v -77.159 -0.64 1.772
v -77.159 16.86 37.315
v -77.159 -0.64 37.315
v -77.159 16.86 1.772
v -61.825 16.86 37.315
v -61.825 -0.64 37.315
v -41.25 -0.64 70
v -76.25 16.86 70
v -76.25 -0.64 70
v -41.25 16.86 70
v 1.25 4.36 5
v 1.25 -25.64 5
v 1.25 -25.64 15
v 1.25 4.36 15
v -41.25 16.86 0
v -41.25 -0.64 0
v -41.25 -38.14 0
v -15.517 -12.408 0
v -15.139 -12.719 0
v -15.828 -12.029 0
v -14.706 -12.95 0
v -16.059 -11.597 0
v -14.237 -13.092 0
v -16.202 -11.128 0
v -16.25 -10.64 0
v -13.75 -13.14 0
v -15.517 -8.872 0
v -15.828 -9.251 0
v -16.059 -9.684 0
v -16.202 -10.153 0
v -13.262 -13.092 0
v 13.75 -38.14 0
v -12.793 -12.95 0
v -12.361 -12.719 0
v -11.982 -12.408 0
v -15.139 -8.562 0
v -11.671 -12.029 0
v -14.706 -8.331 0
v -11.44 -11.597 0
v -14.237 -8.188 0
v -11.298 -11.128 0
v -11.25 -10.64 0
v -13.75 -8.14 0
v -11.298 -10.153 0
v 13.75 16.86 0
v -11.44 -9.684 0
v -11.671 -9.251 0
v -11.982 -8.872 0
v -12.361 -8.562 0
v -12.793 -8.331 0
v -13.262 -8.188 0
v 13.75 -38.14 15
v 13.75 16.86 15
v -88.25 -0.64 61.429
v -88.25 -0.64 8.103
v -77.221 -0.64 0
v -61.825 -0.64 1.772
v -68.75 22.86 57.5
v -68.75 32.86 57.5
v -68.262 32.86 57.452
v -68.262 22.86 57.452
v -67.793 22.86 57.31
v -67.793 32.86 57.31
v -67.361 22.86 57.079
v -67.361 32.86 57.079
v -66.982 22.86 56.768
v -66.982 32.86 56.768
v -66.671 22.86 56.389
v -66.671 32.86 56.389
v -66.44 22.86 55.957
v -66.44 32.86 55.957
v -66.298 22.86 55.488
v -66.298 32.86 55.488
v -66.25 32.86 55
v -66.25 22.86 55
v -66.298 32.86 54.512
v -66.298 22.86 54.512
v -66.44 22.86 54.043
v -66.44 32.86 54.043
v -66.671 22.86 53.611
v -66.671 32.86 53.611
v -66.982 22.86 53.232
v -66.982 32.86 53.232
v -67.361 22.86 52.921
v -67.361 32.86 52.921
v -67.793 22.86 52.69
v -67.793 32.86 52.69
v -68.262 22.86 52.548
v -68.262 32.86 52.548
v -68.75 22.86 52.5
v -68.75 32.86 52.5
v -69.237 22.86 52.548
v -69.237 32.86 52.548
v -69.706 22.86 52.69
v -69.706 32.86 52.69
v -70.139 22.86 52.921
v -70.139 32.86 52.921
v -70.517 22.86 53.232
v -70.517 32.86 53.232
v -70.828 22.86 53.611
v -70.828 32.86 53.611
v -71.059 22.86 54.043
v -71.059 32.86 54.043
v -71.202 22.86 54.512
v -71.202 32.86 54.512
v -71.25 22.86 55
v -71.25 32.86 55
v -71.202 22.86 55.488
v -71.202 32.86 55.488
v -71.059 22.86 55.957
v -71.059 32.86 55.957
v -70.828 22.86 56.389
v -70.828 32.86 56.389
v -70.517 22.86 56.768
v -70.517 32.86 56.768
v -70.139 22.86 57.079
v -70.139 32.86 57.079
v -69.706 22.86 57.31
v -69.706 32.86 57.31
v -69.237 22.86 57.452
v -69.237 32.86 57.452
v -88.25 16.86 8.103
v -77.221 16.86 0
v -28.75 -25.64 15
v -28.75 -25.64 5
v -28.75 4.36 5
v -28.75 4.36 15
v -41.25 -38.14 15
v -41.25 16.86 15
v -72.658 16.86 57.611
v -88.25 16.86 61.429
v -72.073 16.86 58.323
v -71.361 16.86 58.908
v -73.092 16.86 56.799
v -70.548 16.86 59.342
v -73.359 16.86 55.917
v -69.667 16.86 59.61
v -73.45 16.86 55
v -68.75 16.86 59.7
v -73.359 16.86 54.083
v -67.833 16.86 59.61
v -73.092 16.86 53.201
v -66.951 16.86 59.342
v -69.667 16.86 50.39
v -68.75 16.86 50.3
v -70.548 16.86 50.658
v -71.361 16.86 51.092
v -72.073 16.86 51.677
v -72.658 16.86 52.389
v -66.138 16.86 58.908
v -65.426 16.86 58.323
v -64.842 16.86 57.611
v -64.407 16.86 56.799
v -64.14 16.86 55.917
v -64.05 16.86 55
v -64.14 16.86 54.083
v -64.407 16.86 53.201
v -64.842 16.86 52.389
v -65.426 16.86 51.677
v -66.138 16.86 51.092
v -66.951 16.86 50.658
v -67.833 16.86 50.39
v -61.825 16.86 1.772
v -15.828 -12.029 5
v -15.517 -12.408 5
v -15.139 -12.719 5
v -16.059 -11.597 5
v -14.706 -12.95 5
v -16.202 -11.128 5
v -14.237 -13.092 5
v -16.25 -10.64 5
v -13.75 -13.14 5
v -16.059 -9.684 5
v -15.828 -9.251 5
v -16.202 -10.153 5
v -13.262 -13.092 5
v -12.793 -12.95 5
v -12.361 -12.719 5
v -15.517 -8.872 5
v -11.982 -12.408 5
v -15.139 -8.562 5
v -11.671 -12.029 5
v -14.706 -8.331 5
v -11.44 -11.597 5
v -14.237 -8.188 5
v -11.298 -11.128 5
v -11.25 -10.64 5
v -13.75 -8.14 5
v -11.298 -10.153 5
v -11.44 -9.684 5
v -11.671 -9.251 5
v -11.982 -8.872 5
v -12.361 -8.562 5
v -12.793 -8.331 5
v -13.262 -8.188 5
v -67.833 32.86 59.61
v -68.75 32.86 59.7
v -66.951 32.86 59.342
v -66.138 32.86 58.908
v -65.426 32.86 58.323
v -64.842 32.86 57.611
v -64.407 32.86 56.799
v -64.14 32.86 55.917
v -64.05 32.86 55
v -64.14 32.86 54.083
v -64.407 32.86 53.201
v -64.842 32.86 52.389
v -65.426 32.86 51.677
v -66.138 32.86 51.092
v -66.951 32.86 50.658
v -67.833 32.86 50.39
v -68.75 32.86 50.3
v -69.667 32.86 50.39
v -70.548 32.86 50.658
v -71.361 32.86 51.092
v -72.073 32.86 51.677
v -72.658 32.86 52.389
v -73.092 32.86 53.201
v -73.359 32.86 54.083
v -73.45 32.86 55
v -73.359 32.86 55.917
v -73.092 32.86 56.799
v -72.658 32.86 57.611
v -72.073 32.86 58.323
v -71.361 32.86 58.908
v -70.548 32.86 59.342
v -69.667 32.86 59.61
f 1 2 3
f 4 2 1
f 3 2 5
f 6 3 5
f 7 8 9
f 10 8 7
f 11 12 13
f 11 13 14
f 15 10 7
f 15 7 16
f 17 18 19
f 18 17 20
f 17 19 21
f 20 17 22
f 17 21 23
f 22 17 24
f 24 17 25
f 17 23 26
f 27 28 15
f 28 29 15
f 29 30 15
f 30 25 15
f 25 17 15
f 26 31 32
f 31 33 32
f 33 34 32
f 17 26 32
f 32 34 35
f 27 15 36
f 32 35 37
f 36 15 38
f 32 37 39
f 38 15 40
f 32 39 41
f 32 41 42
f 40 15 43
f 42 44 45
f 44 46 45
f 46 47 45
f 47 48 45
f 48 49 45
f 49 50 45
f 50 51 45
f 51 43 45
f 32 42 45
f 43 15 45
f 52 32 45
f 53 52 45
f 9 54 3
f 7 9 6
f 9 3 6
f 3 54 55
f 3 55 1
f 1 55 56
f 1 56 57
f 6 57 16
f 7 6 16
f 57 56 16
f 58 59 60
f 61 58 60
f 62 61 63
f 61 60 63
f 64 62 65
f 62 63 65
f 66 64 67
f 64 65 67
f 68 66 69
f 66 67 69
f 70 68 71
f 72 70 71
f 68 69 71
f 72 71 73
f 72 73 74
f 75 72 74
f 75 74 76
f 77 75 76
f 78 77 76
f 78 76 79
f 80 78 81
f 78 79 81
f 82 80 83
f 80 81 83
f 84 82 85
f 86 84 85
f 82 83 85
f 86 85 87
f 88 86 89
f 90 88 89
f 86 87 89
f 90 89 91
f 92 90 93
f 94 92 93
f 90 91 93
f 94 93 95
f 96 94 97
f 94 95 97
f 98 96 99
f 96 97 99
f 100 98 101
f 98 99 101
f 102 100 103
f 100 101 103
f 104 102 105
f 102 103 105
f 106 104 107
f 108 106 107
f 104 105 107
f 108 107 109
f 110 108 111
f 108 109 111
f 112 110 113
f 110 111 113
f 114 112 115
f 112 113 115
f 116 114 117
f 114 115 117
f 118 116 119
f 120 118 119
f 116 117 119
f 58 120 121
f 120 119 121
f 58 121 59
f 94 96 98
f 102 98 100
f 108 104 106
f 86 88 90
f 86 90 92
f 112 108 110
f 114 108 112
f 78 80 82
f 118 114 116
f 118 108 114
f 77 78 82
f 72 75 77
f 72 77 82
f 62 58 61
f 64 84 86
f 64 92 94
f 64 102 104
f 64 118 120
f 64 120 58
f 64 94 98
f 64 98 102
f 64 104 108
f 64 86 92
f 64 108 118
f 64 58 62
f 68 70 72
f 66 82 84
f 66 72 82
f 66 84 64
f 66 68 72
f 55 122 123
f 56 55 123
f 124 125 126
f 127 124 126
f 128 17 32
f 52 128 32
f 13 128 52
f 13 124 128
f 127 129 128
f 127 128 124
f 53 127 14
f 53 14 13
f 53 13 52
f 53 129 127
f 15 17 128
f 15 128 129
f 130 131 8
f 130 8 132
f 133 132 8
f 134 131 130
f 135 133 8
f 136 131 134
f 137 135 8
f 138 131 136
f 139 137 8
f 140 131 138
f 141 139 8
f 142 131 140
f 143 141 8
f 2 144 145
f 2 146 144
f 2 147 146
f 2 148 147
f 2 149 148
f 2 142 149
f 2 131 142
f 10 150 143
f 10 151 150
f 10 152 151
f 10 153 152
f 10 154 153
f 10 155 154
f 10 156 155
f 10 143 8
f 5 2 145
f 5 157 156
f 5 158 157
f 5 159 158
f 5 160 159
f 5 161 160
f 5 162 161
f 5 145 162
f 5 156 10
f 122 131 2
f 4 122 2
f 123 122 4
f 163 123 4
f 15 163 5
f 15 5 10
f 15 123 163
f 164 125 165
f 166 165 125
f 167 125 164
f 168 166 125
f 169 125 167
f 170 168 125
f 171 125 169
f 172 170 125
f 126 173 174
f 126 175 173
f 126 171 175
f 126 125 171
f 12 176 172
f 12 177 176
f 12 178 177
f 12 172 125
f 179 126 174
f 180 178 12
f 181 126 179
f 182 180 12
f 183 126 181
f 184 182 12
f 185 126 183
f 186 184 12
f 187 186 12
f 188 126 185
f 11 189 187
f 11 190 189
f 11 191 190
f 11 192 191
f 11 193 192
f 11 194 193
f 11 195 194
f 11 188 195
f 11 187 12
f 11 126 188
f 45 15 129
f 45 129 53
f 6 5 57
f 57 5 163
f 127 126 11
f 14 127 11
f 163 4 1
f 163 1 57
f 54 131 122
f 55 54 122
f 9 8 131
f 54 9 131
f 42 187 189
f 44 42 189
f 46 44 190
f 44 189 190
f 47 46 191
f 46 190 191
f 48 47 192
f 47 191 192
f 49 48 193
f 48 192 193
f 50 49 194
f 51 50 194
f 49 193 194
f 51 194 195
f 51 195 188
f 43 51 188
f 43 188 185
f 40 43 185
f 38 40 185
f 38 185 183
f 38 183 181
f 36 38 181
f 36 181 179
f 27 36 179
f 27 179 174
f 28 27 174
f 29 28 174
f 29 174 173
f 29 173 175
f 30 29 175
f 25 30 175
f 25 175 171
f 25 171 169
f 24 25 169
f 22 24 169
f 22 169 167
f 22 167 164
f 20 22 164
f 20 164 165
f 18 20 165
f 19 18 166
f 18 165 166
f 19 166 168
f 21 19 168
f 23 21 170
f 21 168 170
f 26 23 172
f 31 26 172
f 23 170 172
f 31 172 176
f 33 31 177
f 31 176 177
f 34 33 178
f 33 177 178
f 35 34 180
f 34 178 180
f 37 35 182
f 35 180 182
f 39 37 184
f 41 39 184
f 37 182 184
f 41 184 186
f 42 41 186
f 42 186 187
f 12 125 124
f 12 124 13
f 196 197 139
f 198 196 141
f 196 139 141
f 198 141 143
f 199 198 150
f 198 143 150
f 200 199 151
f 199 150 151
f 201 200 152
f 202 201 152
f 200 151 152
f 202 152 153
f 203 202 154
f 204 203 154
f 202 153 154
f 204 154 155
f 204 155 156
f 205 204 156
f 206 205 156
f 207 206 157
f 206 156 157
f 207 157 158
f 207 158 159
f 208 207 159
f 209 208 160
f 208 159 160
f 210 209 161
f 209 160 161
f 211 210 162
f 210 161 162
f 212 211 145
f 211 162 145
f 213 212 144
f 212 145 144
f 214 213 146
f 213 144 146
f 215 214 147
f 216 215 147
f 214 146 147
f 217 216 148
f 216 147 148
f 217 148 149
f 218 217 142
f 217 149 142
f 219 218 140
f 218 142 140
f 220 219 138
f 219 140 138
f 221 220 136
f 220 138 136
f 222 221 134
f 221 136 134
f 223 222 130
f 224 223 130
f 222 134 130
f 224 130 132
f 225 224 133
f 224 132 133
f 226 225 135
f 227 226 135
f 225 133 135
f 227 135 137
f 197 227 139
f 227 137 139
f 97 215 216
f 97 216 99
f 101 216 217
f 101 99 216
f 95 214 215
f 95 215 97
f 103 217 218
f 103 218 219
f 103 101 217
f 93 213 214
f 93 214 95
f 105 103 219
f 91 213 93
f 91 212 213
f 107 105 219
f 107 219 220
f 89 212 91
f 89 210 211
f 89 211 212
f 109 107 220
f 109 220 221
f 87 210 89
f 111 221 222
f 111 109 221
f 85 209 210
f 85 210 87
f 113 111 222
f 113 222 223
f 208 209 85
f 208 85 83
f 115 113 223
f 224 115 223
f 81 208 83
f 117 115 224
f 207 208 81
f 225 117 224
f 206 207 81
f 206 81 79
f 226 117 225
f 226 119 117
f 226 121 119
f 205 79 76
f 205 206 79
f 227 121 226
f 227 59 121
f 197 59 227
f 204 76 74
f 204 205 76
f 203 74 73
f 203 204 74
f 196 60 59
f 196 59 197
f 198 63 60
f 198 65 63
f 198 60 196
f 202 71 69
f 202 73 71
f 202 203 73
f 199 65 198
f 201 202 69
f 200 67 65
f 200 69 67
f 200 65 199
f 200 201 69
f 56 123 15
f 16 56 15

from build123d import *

# Parameters (mm, degrees)
SKETCH1_W           = 55
SKETCH1_H           = 55
SKETCH1_W_2         = 30
SKETCH1_H_2         = 30
BOSS_EXTRUDE1_DEPTH = 15
SKETCH5_W           = 70
SKETCH5_H           = 70
BOSS_EXTRUDE4_DEPTH = 17.5
CUT_EXTRUDE1_DEPTH  = 143.483240955
SKETCH8_W           = 15.334329656
SKETCH8_H           = 35.542805721
CUT_EXTRUDE3_DEPTH  = 126.3514749
SKETCH9_R           = 4.7
BOSS_EXTRUDE5_DEPTH = 16
SKETCH10_R          = 2.5
CUT_EXTRUDE4_DEPTH  = 10
SKETCH12_W          = 30
SKETCH12_H          = 30
BOSS_EXTRUDE6_DEPTH = 5
SKETCH13_R          = 2.5
CUT_EXTRUDE5_DEPTH  = 117.050297595


with BuildPart() as part:
    # Sketch1 → Boss-Extrude1 (new body)
    with BuildSketch(Plane.XY):
        with Locations((-13.749602036, -10.640258422)):
            Rectangle(SKETCH1_W, SKETCH1_H)
        with Locations((-13.749602036, -10.640258422)):
            Rectangle(SKETCH1_W_2, SKETCH1_H_2, mode=Mode.SUBTRACT)
    extrude(amount=BOSS_EXTRUDE1_DEPTH)

    # Sketch12 → Boss-Extrude6 (add)
    with BuildSketch(Plane(origin=(-732.77025481, -892.317517431, 5), x_dir=(1, 0, 0), z_dir=(0, 0, 1))):
        with Locations((719.020652774, 881.677259009)):
            Rectangle(SKETCH12_W, SKETCH12_H)
    extrude(amount=-BOSS_EXTRUDE6_DEPTH)

    # Sketch13 → Cut-Extrude5 (cut, through all)
    with BuildSketch(Plane.XY.offset(5)):
        with Locations((-13.749602036, -10.640258422)):
            Circle(SKETCH13_R)
    extrude(amount=-CUT_EXTRUDE5_DEPTH, mode=Mode.SUBTRACT)


with BuildPart() as body_2:
    # Sketch5 → Boss-Extrude4 (new body)
    with BuildSketch(Plane(origin=(0, 16.859741578, 0), x_dir=(1, 0, 0), z_dir=(0, 1, 0))):
        with Locations((-76.249602036, -35)):
            Rectangle(SKETCH5_W, SKETCH5_H)
    extrude(amount=-BOSS_EXTRUDE4_DEPTH)

    # Sketch6 → Cut-Extrude1 (cut, through all)
    with BuildSketch(Plane(origin=(0, 16.859741578, 0), x_dir=(1, 0, 0), z_dir=(0, 1, 0))):
        Polygon((-77.220552794, 0), (-111.249602036, 0), (-111.249602036, -70), (-76.249602036, -70), (-88.249602036, -61.428571429), (-88.249602036, -8.102672193), align=None)
    extrude(amount=-CUT_EXTRUDE1_DEPTH, mode=Mode.SUBTRACT)

    # Sketch8 → Cut-Extrude3 (cut, through all)
    with BuildSketch(Plane(origin=(0, 16.859741578, 0), x_dir=(1, 0, 0), z_dir=(0, 1, 0))):
        with Locations((-69.49219179, -19.543404801)):
            Rectangle(SKETCH8_W, SKETCH8_H)
    extrude(amount=-CUT_EXTRUDE3_DEPTH, mode=Mode.SUBTRACT)

    # Sketch9 → Boss-Extrude5 (add)
    with BuildSketch(Plane(origin=(0, 16.859741578, 0), x_dir=(1, 0, 0), z_dir=(0, 1, 0))):
        with Locations(Location((-68.749602036, -55, 0), (0, 0, 270))):
            Circle(SKETCH9_R)
    extrude(amount=BOSS_EXTRUDE5_DEPTH)

    # Sketch10 → Cut-Extrude4 (cut)
    with BuildSketch(Plane(origin=(0, 32.859741578, 0), x_dir=(1, 0, 0), z_dir=(0, 1, 0))):
        with Locations(Location((-68.749602036, -55, 0), (0, 0, 270))):
            Circle(SKETCH10_R)
    extrude(amount=-CUT_EXTRUDE4_DEPTH, mode=Mode.SUBTRACT)


solid = Compound([part.part, body_2.part])
